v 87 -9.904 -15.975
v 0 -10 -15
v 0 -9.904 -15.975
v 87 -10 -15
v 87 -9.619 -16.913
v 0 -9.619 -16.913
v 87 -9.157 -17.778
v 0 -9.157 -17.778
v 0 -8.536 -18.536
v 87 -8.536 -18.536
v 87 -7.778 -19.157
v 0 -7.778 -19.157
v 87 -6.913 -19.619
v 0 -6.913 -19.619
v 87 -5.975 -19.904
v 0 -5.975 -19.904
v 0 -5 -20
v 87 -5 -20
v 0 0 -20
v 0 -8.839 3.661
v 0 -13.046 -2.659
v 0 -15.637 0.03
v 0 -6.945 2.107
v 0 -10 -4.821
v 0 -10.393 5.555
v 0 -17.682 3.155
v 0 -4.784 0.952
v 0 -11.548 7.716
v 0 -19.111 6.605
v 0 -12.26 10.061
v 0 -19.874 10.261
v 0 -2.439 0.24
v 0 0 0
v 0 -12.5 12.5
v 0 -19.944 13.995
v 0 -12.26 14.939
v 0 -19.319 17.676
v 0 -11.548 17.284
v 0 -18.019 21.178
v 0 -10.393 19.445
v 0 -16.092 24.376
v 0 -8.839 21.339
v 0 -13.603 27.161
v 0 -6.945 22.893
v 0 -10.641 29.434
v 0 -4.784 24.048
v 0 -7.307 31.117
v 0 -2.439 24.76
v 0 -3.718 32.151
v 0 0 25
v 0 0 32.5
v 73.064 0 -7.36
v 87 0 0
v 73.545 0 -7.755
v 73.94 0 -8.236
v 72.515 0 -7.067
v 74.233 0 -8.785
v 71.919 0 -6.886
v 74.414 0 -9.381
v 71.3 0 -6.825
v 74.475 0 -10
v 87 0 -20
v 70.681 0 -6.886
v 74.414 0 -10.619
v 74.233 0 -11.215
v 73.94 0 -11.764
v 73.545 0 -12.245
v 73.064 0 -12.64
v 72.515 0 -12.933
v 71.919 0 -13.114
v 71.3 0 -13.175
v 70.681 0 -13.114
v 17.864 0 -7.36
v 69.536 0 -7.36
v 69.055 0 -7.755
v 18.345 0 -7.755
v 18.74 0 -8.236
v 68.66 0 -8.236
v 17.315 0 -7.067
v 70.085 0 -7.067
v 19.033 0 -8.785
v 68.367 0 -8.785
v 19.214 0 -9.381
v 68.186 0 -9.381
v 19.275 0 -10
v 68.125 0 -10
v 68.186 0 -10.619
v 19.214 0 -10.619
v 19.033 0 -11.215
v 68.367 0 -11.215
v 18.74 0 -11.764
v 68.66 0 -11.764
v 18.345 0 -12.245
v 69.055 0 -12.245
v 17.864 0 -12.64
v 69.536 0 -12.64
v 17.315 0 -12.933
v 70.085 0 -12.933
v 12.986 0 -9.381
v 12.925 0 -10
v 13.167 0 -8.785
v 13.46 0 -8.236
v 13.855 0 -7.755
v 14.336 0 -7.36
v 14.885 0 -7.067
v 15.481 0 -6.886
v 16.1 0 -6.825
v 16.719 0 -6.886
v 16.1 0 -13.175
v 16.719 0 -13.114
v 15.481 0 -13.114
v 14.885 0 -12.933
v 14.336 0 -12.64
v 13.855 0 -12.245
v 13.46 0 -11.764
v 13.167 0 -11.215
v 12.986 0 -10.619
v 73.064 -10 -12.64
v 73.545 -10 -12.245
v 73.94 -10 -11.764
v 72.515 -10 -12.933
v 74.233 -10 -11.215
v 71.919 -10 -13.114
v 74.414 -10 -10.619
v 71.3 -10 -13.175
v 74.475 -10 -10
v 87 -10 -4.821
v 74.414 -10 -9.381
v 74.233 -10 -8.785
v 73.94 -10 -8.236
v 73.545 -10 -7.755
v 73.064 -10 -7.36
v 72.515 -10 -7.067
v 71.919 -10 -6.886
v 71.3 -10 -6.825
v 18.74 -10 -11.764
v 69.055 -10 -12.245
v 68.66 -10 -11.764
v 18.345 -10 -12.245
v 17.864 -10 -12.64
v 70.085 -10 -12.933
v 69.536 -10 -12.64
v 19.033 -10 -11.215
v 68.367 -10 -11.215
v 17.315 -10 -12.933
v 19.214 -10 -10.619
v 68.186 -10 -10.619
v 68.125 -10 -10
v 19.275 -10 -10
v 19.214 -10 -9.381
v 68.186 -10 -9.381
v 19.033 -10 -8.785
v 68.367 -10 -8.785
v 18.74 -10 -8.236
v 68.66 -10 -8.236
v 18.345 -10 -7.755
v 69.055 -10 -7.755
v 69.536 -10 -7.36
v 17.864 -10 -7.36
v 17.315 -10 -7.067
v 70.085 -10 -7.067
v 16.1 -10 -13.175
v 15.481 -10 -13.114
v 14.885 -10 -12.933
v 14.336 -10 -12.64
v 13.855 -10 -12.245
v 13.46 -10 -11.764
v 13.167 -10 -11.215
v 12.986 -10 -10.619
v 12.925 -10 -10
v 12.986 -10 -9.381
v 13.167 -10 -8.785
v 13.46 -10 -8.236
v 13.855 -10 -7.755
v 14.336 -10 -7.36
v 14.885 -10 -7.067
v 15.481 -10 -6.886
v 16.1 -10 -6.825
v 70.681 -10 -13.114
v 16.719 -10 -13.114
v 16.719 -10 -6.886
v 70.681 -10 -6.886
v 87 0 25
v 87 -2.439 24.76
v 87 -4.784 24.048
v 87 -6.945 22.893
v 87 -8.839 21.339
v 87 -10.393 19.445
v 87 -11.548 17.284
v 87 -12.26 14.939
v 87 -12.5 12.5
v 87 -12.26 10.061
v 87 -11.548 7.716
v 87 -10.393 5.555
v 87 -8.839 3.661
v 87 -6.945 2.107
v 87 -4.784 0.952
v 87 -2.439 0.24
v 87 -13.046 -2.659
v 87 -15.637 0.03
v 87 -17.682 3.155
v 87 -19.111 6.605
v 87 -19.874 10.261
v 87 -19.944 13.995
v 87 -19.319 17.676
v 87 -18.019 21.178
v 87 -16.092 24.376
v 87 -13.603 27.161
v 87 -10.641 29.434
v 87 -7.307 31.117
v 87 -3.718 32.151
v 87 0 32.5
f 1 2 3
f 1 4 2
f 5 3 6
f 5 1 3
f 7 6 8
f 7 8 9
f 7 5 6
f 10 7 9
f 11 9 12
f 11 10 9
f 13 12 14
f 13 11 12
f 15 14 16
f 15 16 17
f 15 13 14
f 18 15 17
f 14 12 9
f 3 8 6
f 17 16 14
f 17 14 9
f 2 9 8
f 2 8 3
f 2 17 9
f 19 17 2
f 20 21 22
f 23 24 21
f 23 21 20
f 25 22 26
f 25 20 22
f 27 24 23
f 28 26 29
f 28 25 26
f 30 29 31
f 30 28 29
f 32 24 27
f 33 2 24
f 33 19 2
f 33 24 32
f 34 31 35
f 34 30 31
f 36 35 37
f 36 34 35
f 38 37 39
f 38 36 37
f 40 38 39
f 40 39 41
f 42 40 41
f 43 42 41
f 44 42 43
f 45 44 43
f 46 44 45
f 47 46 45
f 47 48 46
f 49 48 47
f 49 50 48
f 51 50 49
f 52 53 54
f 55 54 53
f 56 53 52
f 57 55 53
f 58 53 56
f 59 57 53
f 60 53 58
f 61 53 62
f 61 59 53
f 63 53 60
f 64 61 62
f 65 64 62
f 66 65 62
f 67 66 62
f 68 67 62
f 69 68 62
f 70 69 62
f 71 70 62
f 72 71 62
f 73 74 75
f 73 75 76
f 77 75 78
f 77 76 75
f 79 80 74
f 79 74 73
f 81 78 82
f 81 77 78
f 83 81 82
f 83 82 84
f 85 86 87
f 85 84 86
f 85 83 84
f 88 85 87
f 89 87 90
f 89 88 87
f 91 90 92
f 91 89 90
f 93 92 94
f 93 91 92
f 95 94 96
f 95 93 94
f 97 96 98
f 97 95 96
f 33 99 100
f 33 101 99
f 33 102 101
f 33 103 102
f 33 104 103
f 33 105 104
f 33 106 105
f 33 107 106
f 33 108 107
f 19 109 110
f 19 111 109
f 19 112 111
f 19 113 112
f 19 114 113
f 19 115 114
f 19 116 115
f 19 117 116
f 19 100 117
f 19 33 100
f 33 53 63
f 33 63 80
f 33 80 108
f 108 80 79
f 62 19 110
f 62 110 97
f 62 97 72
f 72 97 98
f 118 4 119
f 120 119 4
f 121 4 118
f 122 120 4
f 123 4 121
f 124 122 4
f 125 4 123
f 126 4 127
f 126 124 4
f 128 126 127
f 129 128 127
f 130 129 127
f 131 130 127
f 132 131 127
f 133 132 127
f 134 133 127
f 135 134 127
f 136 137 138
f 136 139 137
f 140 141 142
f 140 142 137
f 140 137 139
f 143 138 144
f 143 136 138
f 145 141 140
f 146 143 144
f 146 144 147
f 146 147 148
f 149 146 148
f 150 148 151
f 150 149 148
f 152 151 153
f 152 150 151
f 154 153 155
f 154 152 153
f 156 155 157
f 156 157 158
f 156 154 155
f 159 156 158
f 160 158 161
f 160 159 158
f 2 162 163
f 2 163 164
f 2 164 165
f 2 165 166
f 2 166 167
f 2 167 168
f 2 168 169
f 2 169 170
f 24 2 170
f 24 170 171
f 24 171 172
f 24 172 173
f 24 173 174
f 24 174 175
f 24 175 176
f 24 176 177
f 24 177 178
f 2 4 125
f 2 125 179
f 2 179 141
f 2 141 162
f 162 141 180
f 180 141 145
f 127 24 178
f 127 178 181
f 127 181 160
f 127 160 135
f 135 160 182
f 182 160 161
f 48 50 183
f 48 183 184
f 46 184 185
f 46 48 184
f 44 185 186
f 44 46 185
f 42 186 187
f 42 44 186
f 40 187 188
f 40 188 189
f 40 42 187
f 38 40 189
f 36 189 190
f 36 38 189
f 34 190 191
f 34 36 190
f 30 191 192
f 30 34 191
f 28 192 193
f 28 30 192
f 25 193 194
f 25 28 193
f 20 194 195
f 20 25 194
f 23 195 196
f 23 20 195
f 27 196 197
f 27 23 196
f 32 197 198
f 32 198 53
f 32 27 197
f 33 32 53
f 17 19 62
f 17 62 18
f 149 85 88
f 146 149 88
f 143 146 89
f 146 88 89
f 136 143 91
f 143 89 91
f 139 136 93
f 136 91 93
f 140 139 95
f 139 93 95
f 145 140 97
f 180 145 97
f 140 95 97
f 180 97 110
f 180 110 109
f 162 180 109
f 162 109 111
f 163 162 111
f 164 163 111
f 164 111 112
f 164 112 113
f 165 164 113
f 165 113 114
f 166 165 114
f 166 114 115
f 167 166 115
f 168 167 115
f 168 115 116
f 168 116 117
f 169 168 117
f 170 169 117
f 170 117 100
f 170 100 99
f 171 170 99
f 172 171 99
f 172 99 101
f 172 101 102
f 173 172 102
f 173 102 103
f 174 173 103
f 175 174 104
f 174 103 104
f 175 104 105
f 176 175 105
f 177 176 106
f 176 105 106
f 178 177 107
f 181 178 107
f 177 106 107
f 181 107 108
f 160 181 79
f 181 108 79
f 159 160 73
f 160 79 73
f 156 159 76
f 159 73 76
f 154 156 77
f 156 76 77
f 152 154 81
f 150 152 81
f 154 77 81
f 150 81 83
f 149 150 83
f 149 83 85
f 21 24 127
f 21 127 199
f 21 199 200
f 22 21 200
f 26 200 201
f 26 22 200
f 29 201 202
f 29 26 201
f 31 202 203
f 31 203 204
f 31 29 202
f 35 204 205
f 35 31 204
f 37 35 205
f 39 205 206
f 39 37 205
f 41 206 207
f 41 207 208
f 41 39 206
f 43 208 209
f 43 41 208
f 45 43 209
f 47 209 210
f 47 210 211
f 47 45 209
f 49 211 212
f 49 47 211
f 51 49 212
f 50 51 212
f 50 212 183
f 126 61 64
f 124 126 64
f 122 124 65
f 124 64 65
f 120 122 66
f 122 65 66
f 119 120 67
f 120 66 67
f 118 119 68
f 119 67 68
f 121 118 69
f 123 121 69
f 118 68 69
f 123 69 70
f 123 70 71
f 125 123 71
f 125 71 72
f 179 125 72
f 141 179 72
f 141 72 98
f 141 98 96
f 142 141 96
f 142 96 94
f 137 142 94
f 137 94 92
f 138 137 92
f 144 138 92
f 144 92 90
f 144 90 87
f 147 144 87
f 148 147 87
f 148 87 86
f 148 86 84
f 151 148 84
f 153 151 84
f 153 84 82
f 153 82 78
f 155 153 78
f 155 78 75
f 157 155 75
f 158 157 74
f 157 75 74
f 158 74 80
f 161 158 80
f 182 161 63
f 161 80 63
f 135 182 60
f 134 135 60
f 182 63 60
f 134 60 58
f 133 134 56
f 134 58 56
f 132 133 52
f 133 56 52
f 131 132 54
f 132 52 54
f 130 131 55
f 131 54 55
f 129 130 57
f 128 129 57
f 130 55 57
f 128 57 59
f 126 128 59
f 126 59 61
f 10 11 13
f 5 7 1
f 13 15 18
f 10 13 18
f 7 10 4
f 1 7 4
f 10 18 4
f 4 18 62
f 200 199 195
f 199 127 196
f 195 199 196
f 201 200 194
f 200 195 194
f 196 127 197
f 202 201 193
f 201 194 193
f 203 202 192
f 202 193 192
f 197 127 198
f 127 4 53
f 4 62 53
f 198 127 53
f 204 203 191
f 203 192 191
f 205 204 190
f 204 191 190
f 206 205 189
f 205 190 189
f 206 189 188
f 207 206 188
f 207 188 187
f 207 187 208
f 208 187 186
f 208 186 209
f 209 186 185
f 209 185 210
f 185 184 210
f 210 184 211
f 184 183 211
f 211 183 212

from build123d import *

# Parameters (mm, degrees)
BOSS_EXTRUDE1_DEPTH = 87
SKETCH2_R           = 3.175
CUT_EXTRUDE1_DEPTH  = 21
FILLET1_R           = 5


with BuildPart() as part:
    # Sketch1 → Boss-Extrude1 (new body)
    with BuildSketch(Plane(origin=(0, 0, 0), x_dir=(0, 0, -1), z_dir=(1, 0, 0))):
        with BuildLine():
            Line((-32.5, 0), (-25, 0))
            ThreePointArc((-25, 0), (-12.5, -12.5), (0, 0))
            Line((0, 0), (20, 0))
            Line((20, 0), (20, -10))
            Line((20, -10), (4.820508076, -10))
            ThreePointArc((4.820508076, -10), (-17.676380902, -19.318516526), (-32.5, 0))
        make_face()
    extrude(amount=BOSS_EXTRUDE1_DEPTH)

    # Sketch2 → Cut-Extrude1 (cut, through all)
    with BuildSketch(Plane(origin=(0, 0, 0), x_dir=(1, 0, 0), z_dir=(0, 1, 0))):
        with Locations((71.3, 10)):
            Circle(SKETCH2_R)
        with Locations((16.1, 10)):
            Circle(SKETCH2_R)
    extrude(amount=-CUT_EXTRUDE1_DEPTH, mode=Mode.SUBTRACT)

    # Fillet1
    fillet1_edges = [part.edges().sort_by_distance(p)[0] for p in [
        (43.5, -10, -20),
    ]]
    fillet(fillet1_edges, radius=FILLET1_R)


solid = part.part
